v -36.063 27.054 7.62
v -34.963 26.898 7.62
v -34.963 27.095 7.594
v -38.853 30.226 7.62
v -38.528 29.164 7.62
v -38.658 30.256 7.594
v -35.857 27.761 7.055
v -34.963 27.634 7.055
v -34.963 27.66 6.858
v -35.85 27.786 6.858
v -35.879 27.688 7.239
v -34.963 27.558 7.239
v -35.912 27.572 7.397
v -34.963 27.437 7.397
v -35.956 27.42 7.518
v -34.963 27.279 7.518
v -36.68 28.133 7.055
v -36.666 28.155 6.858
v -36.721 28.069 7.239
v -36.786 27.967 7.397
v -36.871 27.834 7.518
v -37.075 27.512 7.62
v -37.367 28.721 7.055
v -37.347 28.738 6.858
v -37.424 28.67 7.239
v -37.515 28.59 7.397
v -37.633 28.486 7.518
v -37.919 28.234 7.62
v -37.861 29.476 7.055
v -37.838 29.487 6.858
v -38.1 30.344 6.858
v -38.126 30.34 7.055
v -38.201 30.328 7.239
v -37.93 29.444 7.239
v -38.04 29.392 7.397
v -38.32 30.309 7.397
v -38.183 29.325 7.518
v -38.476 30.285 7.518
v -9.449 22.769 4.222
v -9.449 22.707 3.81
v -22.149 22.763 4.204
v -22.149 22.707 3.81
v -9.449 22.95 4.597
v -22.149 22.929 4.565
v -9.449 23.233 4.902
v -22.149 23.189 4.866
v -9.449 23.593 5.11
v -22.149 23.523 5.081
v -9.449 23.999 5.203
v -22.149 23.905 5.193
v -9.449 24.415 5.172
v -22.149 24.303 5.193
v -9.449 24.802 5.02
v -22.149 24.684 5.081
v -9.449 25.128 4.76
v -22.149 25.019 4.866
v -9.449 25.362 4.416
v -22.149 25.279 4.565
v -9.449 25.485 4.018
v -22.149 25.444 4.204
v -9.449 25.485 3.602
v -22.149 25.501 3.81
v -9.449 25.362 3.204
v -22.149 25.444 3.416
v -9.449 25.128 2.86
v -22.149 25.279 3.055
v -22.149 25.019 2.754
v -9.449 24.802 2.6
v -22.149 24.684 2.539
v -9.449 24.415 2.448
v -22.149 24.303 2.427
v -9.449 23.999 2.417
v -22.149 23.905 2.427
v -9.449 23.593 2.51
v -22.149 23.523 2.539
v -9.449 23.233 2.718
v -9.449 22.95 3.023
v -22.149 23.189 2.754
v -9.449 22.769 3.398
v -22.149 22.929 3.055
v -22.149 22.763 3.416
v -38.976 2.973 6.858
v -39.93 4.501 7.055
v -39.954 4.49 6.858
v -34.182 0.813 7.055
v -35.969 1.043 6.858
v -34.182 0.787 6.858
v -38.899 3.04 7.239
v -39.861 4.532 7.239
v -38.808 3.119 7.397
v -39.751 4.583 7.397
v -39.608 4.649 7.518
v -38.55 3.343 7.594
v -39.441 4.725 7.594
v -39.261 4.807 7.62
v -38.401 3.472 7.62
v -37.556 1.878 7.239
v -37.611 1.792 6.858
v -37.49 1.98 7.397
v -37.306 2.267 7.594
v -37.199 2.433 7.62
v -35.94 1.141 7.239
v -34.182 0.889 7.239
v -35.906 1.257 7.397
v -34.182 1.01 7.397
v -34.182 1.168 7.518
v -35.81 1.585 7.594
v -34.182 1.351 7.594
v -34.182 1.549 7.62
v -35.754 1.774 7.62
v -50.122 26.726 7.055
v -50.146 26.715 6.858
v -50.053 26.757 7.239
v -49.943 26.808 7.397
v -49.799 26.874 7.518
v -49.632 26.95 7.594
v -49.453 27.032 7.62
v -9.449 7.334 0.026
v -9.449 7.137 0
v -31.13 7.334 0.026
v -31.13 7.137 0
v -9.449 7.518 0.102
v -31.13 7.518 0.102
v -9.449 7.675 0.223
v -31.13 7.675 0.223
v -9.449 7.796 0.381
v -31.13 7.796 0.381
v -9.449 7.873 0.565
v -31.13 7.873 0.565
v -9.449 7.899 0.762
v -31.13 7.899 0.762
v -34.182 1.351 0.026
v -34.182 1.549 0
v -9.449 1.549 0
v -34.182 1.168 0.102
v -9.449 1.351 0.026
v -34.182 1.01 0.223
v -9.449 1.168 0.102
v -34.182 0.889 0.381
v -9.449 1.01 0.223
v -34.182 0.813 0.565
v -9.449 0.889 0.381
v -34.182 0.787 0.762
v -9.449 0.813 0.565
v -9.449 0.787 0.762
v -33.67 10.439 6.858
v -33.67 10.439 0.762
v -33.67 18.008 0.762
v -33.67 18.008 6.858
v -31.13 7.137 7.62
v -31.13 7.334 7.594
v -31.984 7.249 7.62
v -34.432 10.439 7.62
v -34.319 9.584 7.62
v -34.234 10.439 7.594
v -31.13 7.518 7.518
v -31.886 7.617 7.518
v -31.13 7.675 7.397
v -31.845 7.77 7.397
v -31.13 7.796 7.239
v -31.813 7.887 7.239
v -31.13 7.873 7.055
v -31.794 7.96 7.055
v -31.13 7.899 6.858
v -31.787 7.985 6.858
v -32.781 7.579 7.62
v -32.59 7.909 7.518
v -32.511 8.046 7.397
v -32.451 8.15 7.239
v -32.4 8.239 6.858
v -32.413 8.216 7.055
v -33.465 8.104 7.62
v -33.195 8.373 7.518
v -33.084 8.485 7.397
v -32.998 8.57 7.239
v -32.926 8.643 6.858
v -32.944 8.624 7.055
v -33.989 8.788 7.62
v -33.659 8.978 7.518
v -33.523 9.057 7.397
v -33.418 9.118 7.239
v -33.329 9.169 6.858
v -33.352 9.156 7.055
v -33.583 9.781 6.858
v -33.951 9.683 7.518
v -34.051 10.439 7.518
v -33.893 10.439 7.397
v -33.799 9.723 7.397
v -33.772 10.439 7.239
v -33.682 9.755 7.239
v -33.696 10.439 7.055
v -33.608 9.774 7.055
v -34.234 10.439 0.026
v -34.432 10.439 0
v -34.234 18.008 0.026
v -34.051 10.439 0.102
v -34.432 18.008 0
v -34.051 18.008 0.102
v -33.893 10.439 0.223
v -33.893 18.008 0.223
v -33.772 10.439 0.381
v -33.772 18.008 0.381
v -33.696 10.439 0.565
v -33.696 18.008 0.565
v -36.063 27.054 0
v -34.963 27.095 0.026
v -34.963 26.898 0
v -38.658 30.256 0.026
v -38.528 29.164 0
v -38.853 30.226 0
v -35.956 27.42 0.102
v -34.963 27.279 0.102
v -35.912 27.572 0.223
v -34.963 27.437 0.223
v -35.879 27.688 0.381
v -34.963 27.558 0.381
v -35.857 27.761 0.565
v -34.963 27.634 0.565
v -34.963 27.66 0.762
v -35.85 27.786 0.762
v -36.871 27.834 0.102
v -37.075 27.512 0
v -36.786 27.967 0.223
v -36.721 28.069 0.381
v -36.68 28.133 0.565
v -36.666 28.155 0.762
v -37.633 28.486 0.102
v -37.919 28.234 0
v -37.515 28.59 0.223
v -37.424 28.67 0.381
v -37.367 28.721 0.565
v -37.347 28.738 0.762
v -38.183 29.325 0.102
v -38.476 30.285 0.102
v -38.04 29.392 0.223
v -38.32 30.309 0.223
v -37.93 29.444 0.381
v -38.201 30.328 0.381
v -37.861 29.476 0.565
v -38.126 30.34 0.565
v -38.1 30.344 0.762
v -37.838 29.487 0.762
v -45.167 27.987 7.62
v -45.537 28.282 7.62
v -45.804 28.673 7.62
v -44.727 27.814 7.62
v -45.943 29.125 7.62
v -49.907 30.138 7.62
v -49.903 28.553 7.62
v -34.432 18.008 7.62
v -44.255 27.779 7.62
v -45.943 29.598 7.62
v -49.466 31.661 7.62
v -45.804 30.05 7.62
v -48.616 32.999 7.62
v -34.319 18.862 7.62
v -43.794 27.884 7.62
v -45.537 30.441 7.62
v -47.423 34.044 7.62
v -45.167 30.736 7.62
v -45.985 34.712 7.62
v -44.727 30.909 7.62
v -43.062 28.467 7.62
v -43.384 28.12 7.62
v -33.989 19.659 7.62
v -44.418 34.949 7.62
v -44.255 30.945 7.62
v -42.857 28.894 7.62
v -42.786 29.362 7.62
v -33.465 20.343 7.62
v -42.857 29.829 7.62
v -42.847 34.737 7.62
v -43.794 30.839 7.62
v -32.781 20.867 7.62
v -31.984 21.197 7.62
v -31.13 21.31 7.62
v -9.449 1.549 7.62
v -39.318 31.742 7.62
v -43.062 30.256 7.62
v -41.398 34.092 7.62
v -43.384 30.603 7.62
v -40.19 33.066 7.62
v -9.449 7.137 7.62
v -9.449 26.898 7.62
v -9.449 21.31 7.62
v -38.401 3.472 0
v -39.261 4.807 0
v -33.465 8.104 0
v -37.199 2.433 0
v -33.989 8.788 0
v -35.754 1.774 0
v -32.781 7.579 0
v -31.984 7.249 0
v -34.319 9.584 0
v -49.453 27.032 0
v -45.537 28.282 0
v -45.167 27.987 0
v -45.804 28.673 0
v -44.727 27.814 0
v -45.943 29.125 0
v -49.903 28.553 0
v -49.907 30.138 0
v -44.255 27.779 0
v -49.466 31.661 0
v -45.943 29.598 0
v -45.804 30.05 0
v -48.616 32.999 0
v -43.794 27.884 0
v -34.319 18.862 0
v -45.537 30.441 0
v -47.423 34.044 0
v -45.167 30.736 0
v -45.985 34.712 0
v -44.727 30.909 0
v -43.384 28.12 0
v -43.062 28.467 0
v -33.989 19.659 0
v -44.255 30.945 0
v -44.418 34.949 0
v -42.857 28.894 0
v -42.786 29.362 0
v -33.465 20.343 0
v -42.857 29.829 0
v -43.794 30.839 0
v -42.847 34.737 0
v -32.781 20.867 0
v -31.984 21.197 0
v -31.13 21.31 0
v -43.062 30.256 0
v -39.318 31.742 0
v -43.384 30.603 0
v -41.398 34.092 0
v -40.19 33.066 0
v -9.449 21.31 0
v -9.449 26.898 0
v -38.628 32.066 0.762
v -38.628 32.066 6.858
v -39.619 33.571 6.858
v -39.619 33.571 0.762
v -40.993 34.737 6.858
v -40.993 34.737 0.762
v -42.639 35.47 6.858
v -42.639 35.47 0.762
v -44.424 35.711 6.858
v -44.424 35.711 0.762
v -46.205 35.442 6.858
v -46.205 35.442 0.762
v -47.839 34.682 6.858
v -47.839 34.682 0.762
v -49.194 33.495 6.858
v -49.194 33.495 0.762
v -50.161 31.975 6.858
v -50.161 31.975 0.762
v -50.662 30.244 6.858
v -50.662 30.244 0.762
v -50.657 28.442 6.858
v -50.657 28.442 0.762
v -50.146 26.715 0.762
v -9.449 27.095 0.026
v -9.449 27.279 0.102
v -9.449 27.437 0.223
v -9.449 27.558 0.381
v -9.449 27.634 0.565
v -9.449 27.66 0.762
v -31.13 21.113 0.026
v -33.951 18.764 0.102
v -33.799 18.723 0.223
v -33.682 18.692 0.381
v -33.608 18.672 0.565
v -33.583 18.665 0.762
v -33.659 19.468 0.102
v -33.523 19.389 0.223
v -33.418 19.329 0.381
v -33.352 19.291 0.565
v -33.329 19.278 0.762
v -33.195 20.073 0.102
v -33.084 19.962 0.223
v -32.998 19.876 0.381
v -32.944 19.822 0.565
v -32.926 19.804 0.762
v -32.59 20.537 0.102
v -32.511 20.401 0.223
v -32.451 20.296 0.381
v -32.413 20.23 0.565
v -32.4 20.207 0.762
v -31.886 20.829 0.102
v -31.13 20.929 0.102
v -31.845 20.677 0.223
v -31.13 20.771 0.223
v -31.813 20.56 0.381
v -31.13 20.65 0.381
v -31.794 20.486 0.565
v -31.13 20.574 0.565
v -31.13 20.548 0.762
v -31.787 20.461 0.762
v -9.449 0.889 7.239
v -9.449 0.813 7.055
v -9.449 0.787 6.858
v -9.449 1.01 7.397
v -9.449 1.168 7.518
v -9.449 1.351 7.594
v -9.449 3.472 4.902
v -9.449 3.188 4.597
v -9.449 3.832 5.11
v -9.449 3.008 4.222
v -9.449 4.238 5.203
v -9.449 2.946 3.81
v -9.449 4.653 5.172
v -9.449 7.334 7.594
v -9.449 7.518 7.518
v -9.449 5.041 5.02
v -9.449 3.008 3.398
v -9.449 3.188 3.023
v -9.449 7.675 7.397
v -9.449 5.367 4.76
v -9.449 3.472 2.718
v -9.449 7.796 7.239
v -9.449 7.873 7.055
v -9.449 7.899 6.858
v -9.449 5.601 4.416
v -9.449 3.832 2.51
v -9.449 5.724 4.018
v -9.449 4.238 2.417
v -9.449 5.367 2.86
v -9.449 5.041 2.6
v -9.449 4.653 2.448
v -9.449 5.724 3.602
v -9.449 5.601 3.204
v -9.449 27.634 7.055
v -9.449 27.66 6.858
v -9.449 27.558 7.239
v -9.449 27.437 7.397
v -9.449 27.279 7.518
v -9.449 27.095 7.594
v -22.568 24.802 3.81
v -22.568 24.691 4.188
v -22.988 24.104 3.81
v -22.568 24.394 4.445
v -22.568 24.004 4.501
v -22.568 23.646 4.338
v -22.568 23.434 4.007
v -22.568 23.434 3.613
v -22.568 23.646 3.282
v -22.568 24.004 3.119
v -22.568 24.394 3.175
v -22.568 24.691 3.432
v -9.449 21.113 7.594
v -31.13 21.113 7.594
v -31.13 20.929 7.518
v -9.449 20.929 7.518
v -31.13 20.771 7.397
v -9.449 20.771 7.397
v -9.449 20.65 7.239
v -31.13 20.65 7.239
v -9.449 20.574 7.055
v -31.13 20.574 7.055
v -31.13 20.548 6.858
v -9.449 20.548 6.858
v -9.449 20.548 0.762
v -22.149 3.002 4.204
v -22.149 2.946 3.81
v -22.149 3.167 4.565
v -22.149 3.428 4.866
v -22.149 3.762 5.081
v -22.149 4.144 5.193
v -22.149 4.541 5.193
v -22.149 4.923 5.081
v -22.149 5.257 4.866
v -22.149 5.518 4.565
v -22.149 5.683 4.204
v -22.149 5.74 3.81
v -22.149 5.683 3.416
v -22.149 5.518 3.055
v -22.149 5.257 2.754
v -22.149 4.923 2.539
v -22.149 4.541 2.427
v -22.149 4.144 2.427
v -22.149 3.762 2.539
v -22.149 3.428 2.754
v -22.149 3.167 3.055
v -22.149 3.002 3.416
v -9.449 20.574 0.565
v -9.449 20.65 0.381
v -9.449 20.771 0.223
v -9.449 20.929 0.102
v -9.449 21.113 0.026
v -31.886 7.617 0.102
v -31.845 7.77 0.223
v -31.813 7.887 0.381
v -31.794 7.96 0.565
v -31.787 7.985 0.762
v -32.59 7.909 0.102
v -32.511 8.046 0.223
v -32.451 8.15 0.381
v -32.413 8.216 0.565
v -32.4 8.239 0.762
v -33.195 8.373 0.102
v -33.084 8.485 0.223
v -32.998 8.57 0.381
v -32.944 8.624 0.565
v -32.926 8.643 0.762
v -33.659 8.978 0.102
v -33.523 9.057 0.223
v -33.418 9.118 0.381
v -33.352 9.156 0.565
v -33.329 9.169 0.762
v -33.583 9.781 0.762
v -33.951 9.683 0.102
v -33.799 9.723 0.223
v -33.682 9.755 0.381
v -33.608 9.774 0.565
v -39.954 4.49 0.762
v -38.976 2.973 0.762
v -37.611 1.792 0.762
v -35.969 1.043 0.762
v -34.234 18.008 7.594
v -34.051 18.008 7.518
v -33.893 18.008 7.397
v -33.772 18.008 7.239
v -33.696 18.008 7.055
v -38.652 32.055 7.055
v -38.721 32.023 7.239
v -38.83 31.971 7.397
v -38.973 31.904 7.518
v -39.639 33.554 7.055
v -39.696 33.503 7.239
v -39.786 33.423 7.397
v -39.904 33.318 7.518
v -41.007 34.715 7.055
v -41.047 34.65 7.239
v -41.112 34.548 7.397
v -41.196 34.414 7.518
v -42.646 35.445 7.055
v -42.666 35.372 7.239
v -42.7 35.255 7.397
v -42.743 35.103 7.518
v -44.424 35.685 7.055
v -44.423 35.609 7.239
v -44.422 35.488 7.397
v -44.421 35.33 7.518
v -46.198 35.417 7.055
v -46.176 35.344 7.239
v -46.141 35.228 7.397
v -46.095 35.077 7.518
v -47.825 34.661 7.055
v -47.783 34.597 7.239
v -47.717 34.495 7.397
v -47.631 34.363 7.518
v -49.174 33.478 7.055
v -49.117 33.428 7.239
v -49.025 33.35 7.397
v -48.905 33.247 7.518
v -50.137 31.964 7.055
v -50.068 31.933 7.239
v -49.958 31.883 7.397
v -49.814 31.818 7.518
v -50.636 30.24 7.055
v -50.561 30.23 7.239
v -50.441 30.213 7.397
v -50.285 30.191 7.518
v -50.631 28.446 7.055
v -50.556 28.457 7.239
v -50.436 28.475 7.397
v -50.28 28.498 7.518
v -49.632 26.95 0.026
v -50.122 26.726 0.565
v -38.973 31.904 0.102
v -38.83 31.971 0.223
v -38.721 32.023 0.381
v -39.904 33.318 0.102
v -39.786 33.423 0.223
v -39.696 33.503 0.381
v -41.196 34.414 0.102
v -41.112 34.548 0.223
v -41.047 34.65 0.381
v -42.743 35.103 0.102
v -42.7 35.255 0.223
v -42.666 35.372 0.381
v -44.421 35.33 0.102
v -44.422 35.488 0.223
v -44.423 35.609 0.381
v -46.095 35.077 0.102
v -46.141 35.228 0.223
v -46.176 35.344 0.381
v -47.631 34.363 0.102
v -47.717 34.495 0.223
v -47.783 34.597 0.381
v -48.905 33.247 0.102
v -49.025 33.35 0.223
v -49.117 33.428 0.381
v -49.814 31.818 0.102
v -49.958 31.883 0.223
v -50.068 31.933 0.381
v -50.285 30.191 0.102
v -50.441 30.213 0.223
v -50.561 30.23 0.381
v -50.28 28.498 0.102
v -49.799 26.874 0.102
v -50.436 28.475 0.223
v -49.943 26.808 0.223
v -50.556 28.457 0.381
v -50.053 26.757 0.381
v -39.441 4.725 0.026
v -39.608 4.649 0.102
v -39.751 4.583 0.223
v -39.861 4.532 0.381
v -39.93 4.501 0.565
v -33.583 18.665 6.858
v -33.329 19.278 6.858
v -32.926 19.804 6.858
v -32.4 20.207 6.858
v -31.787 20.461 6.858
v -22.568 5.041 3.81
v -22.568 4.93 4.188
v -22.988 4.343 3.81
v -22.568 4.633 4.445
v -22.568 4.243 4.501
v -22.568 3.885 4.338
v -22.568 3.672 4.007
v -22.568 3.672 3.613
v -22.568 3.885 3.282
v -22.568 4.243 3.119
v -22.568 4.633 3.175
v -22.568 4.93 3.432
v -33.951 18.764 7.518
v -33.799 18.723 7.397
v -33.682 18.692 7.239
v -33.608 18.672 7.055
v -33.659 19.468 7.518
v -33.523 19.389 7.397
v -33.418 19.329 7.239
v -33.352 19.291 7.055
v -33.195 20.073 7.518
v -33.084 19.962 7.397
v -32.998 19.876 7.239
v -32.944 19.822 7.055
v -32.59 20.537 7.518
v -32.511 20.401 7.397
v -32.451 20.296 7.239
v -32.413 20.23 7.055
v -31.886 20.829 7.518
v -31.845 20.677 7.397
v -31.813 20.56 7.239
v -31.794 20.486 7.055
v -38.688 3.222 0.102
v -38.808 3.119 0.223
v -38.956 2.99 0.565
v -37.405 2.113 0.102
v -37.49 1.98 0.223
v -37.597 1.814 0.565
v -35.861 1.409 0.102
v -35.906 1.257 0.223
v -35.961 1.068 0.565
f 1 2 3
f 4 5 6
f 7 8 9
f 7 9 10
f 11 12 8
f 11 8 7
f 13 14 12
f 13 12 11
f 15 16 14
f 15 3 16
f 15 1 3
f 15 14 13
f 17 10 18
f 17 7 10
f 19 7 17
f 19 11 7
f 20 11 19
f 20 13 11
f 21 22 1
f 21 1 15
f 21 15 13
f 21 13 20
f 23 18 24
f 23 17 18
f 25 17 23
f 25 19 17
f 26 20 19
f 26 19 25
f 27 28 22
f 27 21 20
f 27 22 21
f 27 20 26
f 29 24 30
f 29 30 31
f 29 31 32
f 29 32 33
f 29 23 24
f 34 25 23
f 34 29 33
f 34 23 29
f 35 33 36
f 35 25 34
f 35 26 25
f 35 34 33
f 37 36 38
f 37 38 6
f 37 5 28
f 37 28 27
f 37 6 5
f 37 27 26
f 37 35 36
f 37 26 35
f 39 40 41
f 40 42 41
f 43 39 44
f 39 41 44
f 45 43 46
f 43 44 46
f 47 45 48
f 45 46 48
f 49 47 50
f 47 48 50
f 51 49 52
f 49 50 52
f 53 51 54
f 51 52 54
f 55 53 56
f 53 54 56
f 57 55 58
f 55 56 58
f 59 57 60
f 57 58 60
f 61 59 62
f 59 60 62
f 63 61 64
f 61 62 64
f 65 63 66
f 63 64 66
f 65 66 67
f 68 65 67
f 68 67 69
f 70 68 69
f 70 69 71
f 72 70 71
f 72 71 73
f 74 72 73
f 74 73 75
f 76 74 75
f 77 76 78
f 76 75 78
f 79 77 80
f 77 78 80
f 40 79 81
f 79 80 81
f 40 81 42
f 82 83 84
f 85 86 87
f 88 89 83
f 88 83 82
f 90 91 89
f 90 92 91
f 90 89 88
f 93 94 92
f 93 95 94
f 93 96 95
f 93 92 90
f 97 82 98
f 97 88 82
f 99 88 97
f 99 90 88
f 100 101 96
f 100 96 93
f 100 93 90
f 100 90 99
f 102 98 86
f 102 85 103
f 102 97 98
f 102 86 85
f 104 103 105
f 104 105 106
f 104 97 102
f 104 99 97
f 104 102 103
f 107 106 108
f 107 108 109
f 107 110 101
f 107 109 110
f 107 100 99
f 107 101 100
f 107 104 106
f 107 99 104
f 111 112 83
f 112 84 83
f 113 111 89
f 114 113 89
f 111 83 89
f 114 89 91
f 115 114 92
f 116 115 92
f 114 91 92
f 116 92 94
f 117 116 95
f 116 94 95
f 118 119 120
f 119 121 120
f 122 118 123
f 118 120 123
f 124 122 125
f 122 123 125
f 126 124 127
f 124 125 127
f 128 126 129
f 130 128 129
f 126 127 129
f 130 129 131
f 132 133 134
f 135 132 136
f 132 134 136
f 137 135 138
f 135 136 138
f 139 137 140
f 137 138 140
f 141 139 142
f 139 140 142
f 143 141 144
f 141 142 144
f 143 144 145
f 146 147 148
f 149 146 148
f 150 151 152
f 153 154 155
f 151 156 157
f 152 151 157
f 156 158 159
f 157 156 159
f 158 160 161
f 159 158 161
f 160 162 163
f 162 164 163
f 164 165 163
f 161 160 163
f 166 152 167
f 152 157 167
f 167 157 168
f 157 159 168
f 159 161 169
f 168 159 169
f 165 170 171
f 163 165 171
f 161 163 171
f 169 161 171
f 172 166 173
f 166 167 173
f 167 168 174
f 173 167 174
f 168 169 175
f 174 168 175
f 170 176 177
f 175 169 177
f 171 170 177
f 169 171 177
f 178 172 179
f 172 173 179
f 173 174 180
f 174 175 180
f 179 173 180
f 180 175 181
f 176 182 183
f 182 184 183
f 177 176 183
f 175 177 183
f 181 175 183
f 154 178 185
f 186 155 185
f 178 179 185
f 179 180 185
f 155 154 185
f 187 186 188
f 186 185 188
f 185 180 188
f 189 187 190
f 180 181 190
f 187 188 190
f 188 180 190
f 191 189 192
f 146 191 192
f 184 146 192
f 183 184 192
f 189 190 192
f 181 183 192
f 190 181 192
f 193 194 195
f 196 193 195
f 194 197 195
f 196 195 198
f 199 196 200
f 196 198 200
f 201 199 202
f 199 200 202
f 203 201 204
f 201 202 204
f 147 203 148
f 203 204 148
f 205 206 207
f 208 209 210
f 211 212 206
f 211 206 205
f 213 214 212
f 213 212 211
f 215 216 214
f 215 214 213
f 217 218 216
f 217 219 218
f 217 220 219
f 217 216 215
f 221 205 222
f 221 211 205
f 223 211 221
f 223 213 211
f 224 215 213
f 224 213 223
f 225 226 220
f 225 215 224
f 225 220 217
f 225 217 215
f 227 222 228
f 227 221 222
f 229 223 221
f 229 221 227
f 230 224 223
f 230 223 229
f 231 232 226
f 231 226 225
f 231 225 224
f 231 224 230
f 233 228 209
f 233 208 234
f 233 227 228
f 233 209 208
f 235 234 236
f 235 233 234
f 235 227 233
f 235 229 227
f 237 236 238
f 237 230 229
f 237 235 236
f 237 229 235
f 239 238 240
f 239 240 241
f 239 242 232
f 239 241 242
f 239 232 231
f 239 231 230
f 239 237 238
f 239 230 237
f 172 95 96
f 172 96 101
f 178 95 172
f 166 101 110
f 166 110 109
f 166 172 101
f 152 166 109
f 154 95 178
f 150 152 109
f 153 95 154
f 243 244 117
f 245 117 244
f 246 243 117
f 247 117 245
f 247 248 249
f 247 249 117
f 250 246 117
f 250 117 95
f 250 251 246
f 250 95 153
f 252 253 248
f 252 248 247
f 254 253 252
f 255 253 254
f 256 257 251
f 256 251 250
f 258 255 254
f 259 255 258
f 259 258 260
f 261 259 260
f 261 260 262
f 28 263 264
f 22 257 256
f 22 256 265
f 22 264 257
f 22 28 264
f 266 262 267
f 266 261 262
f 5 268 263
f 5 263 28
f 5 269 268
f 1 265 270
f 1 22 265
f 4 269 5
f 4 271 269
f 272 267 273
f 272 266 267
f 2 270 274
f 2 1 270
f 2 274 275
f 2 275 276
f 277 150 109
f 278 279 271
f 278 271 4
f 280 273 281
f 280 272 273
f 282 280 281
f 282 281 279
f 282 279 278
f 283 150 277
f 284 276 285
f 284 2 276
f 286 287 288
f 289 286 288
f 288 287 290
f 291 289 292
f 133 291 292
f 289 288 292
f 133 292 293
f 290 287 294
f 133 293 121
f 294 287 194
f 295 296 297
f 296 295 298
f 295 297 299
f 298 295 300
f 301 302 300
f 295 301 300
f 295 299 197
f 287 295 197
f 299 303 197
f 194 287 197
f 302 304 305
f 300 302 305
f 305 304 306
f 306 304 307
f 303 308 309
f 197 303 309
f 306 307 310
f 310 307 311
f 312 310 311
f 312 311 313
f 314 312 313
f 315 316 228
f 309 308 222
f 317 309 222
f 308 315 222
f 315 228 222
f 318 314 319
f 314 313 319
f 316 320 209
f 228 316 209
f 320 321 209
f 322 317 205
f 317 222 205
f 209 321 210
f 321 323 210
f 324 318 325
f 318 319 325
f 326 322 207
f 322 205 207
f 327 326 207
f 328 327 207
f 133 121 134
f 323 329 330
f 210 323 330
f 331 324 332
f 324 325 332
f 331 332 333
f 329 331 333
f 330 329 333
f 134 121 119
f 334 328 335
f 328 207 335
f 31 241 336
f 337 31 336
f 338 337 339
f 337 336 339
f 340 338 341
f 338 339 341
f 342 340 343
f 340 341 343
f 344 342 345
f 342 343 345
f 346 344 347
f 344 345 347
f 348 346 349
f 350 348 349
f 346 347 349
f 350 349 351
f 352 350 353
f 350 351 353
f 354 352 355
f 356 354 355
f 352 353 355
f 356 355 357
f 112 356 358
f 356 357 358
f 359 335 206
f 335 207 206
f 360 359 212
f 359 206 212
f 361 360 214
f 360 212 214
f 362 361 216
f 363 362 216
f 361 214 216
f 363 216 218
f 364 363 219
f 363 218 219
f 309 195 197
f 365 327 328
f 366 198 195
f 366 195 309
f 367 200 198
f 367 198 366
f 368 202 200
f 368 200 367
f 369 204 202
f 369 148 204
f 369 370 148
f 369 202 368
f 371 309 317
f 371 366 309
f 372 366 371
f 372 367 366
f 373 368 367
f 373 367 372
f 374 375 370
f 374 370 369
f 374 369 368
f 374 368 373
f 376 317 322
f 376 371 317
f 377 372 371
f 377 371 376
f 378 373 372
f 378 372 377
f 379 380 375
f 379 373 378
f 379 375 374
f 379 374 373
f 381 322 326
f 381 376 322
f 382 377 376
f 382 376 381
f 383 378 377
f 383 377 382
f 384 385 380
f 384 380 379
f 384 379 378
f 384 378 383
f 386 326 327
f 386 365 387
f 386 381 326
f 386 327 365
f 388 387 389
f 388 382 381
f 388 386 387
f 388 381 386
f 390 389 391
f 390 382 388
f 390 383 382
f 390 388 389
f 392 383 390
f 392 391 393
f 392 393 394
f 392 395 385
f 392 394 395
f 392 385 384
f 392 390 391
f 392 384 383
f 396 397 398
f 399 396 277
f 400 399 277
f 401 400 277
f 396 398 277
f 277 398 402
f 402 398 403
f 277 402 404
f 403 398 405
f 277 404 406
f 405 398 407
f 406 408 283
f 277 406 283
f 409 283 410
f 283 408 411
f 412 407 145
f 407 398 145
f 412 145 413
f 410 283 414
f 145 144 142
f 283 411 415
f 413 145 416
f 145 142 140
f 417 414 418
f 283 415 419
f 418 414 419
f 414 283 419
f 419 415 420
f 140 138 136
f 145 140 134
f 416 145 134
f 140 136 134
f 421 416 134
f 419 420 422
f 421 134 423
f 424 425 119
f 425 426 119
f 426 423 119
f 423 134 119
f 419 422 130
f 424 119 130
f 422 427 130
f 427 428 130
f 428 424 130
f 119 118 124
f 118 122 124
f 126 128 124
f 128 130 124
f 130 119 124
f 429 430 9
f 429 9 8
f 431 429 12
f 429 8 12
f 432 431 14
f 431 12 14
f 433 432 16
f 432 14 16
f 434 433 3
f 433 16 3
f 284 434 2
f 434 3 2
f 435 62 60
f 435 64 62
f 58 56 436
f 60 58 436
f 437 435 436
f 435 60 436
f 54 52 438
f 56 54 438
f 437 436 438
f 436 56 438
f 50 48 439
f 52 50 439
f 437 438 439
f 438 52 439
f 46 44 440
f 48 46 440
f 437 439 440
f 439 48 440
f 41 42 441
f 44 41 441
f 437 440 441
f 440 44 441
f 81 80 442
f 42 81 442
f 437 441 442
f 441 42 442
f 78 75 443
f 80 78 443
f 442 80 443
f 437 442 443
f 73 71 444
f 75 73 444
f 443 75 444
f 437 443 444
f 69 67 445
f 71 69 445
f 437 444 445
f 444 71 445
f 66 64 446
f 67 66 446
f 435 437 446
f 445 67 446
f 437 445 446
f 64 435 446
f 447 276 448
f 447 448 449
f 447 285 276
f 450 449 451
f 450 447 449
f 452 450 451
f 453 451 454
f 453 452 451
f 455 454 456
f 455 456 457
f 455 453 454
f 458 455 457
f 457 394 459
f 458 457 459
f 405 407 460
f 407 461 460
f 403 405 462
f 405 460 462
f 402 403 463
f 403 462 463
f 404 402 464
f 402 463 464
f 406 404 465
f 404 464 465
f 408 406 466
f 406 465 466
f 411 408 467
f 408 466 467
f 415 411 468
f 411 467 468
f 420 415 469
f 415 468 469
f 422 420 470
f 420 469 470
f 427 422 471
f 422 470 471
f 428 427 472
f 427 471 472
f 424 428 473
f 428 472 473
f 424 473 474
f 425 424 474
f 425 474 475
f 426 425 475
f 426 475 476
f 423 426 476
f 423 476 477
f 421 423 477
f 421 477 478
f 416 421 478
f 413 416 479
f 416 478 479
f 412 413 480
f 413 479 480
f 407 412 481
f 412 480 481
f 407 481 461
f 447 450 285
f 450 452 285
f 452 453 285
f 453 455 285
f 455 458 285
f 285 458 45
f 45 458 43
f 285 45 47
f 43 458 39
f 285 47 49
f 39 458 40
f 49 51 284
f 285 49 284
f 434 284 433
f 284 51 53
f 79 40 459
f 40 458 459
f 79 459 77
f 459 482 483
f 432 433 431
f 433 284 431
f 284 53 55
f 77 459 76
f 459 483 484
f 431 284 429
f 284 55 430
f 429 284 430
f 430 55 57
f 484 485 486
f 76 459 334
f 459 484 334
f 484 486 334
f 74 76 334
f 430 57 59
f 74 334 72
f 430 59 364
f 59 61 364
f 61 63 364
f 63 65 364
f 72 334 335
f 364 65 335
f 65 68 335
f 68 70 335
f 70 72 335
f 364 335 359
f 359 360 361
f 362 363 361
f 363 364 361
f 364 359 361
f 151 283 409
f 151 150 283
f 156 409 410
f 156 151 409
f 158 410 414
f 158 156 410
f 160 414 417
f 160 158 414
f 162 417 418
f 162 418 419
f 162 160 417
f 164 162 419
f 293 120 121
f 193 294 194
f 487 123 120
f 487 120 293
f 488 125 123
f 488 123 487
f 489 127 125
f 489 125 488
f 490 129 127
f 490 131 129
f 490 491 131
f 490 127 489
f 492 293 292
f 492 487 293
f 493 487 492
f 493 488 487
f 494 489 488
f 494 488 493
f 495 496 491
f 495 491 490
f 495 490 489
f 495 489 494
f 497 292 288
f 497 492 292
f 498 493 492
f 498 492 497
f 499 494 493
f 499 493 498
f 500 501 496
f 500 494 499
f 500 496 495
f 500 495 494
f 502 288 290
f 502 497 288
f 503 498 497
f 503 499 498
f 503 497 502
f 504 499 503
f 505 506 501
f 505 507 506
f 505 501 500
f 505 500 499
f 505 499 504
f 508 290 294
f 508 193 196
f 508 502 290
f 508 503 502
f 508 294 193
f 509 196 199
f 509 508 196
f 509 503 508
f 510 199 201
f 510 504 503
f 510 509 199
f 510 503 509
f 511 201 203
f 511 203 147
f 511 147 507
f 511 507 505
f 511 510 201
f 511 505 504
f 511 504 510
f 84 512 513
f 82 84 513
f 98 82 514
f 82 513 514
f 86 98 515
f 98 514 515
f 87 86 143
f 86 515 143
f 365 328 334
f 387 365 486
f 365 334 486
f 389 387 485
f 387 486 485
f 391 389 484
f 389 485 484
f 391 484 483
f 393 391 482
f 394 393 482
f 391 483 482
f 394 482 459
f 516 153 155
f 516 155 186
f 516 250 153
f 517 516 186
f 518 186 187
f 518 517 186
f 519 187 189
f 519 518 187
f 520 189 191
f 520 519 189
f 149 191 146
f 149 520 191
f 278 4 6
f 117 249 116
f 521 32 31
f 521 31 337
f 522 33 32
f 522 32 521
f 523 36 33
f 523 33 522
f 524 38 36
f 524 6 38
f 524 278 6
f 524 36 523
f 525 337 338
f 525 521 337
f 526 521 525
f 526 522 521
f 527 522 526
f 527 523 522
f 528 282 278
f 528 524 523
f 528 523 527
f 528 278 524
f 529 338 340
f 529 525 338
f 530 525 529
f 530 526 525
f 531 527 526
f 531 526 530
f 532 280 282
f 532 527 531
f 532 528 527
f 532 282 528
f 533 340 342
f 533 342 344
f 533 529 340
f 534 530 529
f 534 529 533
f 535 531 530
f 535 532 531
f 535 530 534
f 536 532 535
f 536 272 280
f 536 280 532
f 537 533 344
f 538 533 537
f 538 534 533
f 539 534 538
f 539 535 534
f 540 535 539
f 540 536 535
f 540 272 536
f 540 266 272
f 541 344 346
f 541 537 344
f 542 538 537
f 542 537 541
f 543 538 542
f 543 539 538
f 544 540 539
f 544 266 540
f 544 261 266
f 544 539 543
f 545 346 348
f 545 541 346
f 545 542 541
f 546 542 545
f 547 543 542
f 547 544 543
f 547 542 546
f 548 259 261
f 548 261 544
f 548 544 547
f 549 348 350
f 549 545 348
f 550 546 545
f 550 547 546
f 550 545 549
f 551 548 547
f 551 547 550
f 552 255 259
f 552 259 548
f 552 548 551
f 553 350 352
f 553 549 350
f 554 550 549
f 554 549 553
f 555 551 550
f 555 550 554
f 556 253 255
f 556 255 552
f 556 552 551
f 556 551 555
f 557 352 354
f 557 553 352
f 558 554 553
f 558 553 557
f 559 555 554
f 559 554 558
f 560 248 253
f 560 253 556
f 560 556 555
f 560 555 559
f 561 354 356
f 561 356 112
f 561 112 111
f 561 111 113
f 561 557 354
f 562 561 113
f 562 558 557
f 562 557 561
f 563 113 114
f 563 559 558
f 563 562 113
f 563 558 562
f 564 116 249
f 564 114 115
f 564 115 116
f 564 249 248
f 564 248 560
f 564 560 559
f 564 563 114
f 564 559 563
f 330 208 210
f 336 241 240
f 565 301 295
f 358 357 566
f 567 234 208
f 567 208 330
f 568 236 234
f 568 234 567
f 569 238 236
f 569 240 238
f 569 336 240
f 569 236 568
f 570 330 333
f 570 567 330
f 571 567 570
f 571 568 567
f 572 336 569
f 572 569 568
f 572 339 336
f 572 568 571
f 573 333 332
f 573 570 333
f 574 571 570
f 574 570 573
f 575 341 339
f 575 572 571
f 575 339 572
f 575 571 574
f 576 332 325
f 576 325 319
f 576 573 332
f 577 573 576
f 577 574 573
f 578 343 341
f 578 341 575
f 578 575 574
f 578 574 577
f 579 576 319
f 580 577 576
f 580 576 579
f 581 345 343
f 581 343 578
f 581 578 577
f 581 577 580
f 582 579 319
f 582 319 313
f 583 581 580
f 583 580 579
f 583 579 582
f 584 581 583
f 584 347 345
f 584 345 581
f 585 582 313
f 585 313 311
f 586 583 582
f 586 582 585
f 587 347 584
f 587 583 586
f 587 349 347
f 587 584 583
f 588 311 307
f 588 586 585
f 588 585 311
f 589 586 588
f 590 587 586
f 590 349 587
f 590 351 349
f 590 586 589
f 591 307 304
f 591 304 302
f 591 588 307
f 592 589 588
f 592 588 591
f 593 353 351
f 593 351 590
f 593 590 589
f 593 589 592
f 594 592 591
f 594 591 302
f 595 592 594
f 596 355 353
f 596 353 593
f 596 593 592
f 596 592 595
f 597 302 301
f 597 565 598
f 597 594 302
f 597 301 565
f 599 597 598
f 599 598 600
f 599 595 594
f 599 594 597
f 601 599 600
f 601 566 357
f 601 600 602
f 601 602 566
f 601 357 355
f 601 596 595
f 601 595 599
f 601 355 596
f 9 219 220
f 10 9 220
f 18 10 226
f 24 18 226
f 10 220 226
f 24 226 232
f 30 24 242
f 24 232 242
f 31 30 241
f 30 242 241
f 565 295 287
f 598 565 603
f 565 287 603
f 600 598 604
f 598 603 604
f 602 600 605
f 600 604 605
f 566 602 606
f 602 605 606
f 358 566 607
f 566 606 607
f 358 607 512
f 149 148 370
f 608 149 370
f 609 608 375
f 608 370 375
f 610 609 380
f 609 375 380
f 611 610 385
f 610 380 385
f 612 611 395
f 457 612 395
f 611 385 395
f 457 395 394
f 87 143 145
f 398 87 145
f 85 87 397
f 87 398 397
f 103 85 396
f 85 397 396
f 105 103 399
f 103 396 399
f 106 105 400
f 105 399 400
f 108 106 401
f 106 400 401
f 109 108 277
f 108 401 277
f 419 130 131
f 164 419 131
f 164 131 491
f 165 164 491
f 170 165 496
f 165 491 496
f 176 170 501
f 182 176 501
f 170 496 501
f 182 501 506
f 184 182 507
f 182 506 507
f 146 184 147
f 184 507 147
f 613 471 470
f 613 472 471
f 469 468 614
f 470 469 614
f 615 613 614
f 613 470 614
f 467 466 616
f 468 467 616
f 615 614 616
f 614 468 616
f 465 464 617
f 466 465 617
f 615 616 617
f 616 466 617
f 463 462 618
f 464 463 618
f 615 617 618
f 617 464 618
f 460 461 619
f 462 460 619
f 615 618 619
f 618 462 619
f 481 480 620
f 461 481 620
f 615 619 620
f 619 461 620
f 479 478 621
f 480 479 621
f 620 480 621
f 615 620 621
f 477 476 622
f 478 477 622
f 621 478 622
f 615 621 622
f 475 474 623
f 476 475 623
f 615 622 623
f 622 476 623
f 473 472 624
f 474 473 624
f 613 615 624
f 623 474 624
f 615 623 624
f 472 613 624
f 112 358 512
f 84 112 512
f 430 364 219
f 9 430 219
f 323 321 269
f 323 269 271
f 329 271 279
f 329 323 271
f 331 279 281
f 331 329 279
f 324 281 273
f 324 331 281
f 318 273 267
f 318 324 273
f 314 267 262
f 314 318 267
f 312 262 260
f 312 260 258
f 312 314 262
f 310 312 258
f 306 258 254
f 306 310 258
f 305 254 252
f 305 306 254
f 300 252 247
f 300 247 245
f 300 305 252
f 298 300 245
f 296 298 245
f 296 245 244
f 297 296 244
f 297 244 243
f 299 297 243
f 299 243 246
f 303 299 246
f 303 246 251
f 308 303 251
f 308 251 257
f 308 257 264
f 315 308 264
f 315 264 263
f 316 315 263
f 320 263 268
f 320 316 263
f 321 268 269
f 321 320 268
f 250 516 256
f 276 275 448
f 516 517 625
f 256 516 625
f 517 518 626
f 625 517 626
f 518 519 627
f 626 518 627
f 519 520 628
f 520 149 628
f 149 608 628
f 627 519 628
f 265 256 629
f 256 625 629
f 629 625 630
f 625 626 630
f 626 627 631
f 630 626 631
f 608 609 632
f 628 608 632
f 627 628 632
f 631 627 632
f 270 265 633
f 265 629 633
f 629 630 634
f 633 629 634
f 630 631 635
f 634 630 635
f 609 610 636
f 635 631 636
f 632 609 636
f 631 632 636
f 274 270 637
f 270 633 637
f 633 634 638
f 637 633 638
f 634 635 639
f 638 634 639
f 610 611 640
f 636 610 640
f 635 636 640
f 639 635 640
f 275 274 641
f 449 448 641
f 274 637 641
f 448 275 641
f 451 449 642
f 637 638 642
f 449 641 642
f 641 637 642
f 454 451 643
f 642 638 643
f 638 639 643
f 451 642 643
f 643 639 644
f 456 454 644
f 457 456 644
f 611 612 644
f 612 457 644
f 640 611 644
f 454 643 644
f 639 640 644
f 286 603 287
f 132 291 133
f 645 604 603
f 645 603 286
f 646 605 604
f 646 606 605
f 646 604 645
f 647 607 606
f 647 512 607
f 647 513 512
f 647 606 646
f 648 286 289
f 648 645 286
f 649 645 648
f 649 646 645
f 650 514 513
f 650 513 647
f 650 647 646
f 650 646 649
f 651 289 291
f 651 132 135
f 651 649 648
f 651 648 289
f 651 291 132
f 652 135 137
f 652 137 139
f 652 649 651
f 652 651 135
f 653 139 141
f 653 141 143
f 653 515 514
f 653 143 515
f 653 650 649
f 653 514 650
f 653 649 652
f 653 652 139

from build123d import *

# Parameters (mm, degrees)
F0_R     = 1.5875
F1_DEPTH = 7.62
F3_D     = 2.794
F3_DEPTH = 12.7
F3_TIP   = 0.8394022848
F5_D     = 2.794
F5_DEPTH = 12.7
F5_TIP   = 0.8394022848
F6_R     = 0.762
F7_R     = 0.762
F8_R     = 0.762


with BuildPart() as f1:
    # F0 (on Top) → F1 (new body)
    with BuildSketch(Plane.XY):
        with BuildLine():
            Line((-9.448561807, 27.6597626507), (-34.9631788839, 27.6597626507))
            ThreePointArc((-34.9631788839, 27.6597626507), (-37.027335895, 28.4223197326), (-38.0999731916, 30.3436959841))
            ThreePointArc((-38.0999731916, 30.3436959841), (-46.2053087095, 35.44162871), (-50.1456144211, 26.7146949509))
            Line((-50.1456144211, 26.7146949509), (-39.9539826805, 4.4896949509))
            ThreePointArc((-39.9539826805, 4.4896949509), (-37.6108431672, 1.7919340437), (-34.1819300664, 0.7865626507))
            Line((-34.1819300664, 0.7865626507), (-9.448561807, 0.7865626507))
            Line((-9.448561807, 0.7865626507), (-9.448561807, 7.8985626507))
            Line((-9.448561807, 7.8985626507), (-31.1296553504, 7.8985626507))
            ThreePointArc((-31.1296553504, 7.8985626507), (-32.9257065746, 8.6425114265), (-33.6696553504, 10.4385626507))
            Line((-33.6696553504, 10.4385626507), (-33.6696553504, 18.0077626507))
            ThreePointArc((-33.6696553504, 18.0077626507), (-32.9257065746, 19.8038138749), (-31.1296553504, 20.5477626507))
            Line((-31.1296553504, 20.5477626507), (-9.448561807, 20.5477626507))
            Line((-9.448561807, 20.5477626507), (-9.448561807, 27.6597626507))
        make_face()
        with Locations((-44.373561807, 29.3615626507)):
            Circle(F0_R, mode=Mode.SUBTRACT)
    extrude(amount=F1_DEPTH)

    # F3
    with Locations(Plane.YZ.offset(-9.448561807)):
        with Locations((24.1037626507, 3.81)):
            Hole(F3_D / 2, depth=F3_DEPTH)
            with Locations((0, 0, -(F3_DEPTH + F3_TIP / 2))):  # 118° drill point
                Cone(0, F3_D / 2, F3_TIP, mode=Mode.SUBTRACT)

    # F5
    with Locations(Plane.YZ.offset(-9.448561807)):
        with Locations((4.3425626507, 3.81)):
            Hole(F5_D / 2, depth=F5_DEPTH)
            with Locations((0, 0, -(F5_DEPTH + F5_TIP / 2))):  # 118° drill point
                Cone(0, F5_D / 2, F5_TIP, mode=Mode.SUBTRACT)

    # F6
    f6_edges = [f1.edges().sort_by_distance(p)[0] for p in [
        (-22.20587, 27.659763, 7.62),
    ]]
    fillet(f6_edges, radius=F6_R)

    # F7
    f7_edges = [f1.edges().sort_by_distance(p)[0] for p in [
        (-33.669655, 14.223163, 7.62),
    ]]
    fillet(f7_edges, radius=F7_R)

    # F8
    f8_edges = [f1.edges().sort_by_distance(p)[0] for p in [
        (-46.205309, 35.441629, 0),
        (-33.669655, 14.223163, 0),
    ]]
    fillet(f8_edges, radius=F8_R)


solid = f1.part
